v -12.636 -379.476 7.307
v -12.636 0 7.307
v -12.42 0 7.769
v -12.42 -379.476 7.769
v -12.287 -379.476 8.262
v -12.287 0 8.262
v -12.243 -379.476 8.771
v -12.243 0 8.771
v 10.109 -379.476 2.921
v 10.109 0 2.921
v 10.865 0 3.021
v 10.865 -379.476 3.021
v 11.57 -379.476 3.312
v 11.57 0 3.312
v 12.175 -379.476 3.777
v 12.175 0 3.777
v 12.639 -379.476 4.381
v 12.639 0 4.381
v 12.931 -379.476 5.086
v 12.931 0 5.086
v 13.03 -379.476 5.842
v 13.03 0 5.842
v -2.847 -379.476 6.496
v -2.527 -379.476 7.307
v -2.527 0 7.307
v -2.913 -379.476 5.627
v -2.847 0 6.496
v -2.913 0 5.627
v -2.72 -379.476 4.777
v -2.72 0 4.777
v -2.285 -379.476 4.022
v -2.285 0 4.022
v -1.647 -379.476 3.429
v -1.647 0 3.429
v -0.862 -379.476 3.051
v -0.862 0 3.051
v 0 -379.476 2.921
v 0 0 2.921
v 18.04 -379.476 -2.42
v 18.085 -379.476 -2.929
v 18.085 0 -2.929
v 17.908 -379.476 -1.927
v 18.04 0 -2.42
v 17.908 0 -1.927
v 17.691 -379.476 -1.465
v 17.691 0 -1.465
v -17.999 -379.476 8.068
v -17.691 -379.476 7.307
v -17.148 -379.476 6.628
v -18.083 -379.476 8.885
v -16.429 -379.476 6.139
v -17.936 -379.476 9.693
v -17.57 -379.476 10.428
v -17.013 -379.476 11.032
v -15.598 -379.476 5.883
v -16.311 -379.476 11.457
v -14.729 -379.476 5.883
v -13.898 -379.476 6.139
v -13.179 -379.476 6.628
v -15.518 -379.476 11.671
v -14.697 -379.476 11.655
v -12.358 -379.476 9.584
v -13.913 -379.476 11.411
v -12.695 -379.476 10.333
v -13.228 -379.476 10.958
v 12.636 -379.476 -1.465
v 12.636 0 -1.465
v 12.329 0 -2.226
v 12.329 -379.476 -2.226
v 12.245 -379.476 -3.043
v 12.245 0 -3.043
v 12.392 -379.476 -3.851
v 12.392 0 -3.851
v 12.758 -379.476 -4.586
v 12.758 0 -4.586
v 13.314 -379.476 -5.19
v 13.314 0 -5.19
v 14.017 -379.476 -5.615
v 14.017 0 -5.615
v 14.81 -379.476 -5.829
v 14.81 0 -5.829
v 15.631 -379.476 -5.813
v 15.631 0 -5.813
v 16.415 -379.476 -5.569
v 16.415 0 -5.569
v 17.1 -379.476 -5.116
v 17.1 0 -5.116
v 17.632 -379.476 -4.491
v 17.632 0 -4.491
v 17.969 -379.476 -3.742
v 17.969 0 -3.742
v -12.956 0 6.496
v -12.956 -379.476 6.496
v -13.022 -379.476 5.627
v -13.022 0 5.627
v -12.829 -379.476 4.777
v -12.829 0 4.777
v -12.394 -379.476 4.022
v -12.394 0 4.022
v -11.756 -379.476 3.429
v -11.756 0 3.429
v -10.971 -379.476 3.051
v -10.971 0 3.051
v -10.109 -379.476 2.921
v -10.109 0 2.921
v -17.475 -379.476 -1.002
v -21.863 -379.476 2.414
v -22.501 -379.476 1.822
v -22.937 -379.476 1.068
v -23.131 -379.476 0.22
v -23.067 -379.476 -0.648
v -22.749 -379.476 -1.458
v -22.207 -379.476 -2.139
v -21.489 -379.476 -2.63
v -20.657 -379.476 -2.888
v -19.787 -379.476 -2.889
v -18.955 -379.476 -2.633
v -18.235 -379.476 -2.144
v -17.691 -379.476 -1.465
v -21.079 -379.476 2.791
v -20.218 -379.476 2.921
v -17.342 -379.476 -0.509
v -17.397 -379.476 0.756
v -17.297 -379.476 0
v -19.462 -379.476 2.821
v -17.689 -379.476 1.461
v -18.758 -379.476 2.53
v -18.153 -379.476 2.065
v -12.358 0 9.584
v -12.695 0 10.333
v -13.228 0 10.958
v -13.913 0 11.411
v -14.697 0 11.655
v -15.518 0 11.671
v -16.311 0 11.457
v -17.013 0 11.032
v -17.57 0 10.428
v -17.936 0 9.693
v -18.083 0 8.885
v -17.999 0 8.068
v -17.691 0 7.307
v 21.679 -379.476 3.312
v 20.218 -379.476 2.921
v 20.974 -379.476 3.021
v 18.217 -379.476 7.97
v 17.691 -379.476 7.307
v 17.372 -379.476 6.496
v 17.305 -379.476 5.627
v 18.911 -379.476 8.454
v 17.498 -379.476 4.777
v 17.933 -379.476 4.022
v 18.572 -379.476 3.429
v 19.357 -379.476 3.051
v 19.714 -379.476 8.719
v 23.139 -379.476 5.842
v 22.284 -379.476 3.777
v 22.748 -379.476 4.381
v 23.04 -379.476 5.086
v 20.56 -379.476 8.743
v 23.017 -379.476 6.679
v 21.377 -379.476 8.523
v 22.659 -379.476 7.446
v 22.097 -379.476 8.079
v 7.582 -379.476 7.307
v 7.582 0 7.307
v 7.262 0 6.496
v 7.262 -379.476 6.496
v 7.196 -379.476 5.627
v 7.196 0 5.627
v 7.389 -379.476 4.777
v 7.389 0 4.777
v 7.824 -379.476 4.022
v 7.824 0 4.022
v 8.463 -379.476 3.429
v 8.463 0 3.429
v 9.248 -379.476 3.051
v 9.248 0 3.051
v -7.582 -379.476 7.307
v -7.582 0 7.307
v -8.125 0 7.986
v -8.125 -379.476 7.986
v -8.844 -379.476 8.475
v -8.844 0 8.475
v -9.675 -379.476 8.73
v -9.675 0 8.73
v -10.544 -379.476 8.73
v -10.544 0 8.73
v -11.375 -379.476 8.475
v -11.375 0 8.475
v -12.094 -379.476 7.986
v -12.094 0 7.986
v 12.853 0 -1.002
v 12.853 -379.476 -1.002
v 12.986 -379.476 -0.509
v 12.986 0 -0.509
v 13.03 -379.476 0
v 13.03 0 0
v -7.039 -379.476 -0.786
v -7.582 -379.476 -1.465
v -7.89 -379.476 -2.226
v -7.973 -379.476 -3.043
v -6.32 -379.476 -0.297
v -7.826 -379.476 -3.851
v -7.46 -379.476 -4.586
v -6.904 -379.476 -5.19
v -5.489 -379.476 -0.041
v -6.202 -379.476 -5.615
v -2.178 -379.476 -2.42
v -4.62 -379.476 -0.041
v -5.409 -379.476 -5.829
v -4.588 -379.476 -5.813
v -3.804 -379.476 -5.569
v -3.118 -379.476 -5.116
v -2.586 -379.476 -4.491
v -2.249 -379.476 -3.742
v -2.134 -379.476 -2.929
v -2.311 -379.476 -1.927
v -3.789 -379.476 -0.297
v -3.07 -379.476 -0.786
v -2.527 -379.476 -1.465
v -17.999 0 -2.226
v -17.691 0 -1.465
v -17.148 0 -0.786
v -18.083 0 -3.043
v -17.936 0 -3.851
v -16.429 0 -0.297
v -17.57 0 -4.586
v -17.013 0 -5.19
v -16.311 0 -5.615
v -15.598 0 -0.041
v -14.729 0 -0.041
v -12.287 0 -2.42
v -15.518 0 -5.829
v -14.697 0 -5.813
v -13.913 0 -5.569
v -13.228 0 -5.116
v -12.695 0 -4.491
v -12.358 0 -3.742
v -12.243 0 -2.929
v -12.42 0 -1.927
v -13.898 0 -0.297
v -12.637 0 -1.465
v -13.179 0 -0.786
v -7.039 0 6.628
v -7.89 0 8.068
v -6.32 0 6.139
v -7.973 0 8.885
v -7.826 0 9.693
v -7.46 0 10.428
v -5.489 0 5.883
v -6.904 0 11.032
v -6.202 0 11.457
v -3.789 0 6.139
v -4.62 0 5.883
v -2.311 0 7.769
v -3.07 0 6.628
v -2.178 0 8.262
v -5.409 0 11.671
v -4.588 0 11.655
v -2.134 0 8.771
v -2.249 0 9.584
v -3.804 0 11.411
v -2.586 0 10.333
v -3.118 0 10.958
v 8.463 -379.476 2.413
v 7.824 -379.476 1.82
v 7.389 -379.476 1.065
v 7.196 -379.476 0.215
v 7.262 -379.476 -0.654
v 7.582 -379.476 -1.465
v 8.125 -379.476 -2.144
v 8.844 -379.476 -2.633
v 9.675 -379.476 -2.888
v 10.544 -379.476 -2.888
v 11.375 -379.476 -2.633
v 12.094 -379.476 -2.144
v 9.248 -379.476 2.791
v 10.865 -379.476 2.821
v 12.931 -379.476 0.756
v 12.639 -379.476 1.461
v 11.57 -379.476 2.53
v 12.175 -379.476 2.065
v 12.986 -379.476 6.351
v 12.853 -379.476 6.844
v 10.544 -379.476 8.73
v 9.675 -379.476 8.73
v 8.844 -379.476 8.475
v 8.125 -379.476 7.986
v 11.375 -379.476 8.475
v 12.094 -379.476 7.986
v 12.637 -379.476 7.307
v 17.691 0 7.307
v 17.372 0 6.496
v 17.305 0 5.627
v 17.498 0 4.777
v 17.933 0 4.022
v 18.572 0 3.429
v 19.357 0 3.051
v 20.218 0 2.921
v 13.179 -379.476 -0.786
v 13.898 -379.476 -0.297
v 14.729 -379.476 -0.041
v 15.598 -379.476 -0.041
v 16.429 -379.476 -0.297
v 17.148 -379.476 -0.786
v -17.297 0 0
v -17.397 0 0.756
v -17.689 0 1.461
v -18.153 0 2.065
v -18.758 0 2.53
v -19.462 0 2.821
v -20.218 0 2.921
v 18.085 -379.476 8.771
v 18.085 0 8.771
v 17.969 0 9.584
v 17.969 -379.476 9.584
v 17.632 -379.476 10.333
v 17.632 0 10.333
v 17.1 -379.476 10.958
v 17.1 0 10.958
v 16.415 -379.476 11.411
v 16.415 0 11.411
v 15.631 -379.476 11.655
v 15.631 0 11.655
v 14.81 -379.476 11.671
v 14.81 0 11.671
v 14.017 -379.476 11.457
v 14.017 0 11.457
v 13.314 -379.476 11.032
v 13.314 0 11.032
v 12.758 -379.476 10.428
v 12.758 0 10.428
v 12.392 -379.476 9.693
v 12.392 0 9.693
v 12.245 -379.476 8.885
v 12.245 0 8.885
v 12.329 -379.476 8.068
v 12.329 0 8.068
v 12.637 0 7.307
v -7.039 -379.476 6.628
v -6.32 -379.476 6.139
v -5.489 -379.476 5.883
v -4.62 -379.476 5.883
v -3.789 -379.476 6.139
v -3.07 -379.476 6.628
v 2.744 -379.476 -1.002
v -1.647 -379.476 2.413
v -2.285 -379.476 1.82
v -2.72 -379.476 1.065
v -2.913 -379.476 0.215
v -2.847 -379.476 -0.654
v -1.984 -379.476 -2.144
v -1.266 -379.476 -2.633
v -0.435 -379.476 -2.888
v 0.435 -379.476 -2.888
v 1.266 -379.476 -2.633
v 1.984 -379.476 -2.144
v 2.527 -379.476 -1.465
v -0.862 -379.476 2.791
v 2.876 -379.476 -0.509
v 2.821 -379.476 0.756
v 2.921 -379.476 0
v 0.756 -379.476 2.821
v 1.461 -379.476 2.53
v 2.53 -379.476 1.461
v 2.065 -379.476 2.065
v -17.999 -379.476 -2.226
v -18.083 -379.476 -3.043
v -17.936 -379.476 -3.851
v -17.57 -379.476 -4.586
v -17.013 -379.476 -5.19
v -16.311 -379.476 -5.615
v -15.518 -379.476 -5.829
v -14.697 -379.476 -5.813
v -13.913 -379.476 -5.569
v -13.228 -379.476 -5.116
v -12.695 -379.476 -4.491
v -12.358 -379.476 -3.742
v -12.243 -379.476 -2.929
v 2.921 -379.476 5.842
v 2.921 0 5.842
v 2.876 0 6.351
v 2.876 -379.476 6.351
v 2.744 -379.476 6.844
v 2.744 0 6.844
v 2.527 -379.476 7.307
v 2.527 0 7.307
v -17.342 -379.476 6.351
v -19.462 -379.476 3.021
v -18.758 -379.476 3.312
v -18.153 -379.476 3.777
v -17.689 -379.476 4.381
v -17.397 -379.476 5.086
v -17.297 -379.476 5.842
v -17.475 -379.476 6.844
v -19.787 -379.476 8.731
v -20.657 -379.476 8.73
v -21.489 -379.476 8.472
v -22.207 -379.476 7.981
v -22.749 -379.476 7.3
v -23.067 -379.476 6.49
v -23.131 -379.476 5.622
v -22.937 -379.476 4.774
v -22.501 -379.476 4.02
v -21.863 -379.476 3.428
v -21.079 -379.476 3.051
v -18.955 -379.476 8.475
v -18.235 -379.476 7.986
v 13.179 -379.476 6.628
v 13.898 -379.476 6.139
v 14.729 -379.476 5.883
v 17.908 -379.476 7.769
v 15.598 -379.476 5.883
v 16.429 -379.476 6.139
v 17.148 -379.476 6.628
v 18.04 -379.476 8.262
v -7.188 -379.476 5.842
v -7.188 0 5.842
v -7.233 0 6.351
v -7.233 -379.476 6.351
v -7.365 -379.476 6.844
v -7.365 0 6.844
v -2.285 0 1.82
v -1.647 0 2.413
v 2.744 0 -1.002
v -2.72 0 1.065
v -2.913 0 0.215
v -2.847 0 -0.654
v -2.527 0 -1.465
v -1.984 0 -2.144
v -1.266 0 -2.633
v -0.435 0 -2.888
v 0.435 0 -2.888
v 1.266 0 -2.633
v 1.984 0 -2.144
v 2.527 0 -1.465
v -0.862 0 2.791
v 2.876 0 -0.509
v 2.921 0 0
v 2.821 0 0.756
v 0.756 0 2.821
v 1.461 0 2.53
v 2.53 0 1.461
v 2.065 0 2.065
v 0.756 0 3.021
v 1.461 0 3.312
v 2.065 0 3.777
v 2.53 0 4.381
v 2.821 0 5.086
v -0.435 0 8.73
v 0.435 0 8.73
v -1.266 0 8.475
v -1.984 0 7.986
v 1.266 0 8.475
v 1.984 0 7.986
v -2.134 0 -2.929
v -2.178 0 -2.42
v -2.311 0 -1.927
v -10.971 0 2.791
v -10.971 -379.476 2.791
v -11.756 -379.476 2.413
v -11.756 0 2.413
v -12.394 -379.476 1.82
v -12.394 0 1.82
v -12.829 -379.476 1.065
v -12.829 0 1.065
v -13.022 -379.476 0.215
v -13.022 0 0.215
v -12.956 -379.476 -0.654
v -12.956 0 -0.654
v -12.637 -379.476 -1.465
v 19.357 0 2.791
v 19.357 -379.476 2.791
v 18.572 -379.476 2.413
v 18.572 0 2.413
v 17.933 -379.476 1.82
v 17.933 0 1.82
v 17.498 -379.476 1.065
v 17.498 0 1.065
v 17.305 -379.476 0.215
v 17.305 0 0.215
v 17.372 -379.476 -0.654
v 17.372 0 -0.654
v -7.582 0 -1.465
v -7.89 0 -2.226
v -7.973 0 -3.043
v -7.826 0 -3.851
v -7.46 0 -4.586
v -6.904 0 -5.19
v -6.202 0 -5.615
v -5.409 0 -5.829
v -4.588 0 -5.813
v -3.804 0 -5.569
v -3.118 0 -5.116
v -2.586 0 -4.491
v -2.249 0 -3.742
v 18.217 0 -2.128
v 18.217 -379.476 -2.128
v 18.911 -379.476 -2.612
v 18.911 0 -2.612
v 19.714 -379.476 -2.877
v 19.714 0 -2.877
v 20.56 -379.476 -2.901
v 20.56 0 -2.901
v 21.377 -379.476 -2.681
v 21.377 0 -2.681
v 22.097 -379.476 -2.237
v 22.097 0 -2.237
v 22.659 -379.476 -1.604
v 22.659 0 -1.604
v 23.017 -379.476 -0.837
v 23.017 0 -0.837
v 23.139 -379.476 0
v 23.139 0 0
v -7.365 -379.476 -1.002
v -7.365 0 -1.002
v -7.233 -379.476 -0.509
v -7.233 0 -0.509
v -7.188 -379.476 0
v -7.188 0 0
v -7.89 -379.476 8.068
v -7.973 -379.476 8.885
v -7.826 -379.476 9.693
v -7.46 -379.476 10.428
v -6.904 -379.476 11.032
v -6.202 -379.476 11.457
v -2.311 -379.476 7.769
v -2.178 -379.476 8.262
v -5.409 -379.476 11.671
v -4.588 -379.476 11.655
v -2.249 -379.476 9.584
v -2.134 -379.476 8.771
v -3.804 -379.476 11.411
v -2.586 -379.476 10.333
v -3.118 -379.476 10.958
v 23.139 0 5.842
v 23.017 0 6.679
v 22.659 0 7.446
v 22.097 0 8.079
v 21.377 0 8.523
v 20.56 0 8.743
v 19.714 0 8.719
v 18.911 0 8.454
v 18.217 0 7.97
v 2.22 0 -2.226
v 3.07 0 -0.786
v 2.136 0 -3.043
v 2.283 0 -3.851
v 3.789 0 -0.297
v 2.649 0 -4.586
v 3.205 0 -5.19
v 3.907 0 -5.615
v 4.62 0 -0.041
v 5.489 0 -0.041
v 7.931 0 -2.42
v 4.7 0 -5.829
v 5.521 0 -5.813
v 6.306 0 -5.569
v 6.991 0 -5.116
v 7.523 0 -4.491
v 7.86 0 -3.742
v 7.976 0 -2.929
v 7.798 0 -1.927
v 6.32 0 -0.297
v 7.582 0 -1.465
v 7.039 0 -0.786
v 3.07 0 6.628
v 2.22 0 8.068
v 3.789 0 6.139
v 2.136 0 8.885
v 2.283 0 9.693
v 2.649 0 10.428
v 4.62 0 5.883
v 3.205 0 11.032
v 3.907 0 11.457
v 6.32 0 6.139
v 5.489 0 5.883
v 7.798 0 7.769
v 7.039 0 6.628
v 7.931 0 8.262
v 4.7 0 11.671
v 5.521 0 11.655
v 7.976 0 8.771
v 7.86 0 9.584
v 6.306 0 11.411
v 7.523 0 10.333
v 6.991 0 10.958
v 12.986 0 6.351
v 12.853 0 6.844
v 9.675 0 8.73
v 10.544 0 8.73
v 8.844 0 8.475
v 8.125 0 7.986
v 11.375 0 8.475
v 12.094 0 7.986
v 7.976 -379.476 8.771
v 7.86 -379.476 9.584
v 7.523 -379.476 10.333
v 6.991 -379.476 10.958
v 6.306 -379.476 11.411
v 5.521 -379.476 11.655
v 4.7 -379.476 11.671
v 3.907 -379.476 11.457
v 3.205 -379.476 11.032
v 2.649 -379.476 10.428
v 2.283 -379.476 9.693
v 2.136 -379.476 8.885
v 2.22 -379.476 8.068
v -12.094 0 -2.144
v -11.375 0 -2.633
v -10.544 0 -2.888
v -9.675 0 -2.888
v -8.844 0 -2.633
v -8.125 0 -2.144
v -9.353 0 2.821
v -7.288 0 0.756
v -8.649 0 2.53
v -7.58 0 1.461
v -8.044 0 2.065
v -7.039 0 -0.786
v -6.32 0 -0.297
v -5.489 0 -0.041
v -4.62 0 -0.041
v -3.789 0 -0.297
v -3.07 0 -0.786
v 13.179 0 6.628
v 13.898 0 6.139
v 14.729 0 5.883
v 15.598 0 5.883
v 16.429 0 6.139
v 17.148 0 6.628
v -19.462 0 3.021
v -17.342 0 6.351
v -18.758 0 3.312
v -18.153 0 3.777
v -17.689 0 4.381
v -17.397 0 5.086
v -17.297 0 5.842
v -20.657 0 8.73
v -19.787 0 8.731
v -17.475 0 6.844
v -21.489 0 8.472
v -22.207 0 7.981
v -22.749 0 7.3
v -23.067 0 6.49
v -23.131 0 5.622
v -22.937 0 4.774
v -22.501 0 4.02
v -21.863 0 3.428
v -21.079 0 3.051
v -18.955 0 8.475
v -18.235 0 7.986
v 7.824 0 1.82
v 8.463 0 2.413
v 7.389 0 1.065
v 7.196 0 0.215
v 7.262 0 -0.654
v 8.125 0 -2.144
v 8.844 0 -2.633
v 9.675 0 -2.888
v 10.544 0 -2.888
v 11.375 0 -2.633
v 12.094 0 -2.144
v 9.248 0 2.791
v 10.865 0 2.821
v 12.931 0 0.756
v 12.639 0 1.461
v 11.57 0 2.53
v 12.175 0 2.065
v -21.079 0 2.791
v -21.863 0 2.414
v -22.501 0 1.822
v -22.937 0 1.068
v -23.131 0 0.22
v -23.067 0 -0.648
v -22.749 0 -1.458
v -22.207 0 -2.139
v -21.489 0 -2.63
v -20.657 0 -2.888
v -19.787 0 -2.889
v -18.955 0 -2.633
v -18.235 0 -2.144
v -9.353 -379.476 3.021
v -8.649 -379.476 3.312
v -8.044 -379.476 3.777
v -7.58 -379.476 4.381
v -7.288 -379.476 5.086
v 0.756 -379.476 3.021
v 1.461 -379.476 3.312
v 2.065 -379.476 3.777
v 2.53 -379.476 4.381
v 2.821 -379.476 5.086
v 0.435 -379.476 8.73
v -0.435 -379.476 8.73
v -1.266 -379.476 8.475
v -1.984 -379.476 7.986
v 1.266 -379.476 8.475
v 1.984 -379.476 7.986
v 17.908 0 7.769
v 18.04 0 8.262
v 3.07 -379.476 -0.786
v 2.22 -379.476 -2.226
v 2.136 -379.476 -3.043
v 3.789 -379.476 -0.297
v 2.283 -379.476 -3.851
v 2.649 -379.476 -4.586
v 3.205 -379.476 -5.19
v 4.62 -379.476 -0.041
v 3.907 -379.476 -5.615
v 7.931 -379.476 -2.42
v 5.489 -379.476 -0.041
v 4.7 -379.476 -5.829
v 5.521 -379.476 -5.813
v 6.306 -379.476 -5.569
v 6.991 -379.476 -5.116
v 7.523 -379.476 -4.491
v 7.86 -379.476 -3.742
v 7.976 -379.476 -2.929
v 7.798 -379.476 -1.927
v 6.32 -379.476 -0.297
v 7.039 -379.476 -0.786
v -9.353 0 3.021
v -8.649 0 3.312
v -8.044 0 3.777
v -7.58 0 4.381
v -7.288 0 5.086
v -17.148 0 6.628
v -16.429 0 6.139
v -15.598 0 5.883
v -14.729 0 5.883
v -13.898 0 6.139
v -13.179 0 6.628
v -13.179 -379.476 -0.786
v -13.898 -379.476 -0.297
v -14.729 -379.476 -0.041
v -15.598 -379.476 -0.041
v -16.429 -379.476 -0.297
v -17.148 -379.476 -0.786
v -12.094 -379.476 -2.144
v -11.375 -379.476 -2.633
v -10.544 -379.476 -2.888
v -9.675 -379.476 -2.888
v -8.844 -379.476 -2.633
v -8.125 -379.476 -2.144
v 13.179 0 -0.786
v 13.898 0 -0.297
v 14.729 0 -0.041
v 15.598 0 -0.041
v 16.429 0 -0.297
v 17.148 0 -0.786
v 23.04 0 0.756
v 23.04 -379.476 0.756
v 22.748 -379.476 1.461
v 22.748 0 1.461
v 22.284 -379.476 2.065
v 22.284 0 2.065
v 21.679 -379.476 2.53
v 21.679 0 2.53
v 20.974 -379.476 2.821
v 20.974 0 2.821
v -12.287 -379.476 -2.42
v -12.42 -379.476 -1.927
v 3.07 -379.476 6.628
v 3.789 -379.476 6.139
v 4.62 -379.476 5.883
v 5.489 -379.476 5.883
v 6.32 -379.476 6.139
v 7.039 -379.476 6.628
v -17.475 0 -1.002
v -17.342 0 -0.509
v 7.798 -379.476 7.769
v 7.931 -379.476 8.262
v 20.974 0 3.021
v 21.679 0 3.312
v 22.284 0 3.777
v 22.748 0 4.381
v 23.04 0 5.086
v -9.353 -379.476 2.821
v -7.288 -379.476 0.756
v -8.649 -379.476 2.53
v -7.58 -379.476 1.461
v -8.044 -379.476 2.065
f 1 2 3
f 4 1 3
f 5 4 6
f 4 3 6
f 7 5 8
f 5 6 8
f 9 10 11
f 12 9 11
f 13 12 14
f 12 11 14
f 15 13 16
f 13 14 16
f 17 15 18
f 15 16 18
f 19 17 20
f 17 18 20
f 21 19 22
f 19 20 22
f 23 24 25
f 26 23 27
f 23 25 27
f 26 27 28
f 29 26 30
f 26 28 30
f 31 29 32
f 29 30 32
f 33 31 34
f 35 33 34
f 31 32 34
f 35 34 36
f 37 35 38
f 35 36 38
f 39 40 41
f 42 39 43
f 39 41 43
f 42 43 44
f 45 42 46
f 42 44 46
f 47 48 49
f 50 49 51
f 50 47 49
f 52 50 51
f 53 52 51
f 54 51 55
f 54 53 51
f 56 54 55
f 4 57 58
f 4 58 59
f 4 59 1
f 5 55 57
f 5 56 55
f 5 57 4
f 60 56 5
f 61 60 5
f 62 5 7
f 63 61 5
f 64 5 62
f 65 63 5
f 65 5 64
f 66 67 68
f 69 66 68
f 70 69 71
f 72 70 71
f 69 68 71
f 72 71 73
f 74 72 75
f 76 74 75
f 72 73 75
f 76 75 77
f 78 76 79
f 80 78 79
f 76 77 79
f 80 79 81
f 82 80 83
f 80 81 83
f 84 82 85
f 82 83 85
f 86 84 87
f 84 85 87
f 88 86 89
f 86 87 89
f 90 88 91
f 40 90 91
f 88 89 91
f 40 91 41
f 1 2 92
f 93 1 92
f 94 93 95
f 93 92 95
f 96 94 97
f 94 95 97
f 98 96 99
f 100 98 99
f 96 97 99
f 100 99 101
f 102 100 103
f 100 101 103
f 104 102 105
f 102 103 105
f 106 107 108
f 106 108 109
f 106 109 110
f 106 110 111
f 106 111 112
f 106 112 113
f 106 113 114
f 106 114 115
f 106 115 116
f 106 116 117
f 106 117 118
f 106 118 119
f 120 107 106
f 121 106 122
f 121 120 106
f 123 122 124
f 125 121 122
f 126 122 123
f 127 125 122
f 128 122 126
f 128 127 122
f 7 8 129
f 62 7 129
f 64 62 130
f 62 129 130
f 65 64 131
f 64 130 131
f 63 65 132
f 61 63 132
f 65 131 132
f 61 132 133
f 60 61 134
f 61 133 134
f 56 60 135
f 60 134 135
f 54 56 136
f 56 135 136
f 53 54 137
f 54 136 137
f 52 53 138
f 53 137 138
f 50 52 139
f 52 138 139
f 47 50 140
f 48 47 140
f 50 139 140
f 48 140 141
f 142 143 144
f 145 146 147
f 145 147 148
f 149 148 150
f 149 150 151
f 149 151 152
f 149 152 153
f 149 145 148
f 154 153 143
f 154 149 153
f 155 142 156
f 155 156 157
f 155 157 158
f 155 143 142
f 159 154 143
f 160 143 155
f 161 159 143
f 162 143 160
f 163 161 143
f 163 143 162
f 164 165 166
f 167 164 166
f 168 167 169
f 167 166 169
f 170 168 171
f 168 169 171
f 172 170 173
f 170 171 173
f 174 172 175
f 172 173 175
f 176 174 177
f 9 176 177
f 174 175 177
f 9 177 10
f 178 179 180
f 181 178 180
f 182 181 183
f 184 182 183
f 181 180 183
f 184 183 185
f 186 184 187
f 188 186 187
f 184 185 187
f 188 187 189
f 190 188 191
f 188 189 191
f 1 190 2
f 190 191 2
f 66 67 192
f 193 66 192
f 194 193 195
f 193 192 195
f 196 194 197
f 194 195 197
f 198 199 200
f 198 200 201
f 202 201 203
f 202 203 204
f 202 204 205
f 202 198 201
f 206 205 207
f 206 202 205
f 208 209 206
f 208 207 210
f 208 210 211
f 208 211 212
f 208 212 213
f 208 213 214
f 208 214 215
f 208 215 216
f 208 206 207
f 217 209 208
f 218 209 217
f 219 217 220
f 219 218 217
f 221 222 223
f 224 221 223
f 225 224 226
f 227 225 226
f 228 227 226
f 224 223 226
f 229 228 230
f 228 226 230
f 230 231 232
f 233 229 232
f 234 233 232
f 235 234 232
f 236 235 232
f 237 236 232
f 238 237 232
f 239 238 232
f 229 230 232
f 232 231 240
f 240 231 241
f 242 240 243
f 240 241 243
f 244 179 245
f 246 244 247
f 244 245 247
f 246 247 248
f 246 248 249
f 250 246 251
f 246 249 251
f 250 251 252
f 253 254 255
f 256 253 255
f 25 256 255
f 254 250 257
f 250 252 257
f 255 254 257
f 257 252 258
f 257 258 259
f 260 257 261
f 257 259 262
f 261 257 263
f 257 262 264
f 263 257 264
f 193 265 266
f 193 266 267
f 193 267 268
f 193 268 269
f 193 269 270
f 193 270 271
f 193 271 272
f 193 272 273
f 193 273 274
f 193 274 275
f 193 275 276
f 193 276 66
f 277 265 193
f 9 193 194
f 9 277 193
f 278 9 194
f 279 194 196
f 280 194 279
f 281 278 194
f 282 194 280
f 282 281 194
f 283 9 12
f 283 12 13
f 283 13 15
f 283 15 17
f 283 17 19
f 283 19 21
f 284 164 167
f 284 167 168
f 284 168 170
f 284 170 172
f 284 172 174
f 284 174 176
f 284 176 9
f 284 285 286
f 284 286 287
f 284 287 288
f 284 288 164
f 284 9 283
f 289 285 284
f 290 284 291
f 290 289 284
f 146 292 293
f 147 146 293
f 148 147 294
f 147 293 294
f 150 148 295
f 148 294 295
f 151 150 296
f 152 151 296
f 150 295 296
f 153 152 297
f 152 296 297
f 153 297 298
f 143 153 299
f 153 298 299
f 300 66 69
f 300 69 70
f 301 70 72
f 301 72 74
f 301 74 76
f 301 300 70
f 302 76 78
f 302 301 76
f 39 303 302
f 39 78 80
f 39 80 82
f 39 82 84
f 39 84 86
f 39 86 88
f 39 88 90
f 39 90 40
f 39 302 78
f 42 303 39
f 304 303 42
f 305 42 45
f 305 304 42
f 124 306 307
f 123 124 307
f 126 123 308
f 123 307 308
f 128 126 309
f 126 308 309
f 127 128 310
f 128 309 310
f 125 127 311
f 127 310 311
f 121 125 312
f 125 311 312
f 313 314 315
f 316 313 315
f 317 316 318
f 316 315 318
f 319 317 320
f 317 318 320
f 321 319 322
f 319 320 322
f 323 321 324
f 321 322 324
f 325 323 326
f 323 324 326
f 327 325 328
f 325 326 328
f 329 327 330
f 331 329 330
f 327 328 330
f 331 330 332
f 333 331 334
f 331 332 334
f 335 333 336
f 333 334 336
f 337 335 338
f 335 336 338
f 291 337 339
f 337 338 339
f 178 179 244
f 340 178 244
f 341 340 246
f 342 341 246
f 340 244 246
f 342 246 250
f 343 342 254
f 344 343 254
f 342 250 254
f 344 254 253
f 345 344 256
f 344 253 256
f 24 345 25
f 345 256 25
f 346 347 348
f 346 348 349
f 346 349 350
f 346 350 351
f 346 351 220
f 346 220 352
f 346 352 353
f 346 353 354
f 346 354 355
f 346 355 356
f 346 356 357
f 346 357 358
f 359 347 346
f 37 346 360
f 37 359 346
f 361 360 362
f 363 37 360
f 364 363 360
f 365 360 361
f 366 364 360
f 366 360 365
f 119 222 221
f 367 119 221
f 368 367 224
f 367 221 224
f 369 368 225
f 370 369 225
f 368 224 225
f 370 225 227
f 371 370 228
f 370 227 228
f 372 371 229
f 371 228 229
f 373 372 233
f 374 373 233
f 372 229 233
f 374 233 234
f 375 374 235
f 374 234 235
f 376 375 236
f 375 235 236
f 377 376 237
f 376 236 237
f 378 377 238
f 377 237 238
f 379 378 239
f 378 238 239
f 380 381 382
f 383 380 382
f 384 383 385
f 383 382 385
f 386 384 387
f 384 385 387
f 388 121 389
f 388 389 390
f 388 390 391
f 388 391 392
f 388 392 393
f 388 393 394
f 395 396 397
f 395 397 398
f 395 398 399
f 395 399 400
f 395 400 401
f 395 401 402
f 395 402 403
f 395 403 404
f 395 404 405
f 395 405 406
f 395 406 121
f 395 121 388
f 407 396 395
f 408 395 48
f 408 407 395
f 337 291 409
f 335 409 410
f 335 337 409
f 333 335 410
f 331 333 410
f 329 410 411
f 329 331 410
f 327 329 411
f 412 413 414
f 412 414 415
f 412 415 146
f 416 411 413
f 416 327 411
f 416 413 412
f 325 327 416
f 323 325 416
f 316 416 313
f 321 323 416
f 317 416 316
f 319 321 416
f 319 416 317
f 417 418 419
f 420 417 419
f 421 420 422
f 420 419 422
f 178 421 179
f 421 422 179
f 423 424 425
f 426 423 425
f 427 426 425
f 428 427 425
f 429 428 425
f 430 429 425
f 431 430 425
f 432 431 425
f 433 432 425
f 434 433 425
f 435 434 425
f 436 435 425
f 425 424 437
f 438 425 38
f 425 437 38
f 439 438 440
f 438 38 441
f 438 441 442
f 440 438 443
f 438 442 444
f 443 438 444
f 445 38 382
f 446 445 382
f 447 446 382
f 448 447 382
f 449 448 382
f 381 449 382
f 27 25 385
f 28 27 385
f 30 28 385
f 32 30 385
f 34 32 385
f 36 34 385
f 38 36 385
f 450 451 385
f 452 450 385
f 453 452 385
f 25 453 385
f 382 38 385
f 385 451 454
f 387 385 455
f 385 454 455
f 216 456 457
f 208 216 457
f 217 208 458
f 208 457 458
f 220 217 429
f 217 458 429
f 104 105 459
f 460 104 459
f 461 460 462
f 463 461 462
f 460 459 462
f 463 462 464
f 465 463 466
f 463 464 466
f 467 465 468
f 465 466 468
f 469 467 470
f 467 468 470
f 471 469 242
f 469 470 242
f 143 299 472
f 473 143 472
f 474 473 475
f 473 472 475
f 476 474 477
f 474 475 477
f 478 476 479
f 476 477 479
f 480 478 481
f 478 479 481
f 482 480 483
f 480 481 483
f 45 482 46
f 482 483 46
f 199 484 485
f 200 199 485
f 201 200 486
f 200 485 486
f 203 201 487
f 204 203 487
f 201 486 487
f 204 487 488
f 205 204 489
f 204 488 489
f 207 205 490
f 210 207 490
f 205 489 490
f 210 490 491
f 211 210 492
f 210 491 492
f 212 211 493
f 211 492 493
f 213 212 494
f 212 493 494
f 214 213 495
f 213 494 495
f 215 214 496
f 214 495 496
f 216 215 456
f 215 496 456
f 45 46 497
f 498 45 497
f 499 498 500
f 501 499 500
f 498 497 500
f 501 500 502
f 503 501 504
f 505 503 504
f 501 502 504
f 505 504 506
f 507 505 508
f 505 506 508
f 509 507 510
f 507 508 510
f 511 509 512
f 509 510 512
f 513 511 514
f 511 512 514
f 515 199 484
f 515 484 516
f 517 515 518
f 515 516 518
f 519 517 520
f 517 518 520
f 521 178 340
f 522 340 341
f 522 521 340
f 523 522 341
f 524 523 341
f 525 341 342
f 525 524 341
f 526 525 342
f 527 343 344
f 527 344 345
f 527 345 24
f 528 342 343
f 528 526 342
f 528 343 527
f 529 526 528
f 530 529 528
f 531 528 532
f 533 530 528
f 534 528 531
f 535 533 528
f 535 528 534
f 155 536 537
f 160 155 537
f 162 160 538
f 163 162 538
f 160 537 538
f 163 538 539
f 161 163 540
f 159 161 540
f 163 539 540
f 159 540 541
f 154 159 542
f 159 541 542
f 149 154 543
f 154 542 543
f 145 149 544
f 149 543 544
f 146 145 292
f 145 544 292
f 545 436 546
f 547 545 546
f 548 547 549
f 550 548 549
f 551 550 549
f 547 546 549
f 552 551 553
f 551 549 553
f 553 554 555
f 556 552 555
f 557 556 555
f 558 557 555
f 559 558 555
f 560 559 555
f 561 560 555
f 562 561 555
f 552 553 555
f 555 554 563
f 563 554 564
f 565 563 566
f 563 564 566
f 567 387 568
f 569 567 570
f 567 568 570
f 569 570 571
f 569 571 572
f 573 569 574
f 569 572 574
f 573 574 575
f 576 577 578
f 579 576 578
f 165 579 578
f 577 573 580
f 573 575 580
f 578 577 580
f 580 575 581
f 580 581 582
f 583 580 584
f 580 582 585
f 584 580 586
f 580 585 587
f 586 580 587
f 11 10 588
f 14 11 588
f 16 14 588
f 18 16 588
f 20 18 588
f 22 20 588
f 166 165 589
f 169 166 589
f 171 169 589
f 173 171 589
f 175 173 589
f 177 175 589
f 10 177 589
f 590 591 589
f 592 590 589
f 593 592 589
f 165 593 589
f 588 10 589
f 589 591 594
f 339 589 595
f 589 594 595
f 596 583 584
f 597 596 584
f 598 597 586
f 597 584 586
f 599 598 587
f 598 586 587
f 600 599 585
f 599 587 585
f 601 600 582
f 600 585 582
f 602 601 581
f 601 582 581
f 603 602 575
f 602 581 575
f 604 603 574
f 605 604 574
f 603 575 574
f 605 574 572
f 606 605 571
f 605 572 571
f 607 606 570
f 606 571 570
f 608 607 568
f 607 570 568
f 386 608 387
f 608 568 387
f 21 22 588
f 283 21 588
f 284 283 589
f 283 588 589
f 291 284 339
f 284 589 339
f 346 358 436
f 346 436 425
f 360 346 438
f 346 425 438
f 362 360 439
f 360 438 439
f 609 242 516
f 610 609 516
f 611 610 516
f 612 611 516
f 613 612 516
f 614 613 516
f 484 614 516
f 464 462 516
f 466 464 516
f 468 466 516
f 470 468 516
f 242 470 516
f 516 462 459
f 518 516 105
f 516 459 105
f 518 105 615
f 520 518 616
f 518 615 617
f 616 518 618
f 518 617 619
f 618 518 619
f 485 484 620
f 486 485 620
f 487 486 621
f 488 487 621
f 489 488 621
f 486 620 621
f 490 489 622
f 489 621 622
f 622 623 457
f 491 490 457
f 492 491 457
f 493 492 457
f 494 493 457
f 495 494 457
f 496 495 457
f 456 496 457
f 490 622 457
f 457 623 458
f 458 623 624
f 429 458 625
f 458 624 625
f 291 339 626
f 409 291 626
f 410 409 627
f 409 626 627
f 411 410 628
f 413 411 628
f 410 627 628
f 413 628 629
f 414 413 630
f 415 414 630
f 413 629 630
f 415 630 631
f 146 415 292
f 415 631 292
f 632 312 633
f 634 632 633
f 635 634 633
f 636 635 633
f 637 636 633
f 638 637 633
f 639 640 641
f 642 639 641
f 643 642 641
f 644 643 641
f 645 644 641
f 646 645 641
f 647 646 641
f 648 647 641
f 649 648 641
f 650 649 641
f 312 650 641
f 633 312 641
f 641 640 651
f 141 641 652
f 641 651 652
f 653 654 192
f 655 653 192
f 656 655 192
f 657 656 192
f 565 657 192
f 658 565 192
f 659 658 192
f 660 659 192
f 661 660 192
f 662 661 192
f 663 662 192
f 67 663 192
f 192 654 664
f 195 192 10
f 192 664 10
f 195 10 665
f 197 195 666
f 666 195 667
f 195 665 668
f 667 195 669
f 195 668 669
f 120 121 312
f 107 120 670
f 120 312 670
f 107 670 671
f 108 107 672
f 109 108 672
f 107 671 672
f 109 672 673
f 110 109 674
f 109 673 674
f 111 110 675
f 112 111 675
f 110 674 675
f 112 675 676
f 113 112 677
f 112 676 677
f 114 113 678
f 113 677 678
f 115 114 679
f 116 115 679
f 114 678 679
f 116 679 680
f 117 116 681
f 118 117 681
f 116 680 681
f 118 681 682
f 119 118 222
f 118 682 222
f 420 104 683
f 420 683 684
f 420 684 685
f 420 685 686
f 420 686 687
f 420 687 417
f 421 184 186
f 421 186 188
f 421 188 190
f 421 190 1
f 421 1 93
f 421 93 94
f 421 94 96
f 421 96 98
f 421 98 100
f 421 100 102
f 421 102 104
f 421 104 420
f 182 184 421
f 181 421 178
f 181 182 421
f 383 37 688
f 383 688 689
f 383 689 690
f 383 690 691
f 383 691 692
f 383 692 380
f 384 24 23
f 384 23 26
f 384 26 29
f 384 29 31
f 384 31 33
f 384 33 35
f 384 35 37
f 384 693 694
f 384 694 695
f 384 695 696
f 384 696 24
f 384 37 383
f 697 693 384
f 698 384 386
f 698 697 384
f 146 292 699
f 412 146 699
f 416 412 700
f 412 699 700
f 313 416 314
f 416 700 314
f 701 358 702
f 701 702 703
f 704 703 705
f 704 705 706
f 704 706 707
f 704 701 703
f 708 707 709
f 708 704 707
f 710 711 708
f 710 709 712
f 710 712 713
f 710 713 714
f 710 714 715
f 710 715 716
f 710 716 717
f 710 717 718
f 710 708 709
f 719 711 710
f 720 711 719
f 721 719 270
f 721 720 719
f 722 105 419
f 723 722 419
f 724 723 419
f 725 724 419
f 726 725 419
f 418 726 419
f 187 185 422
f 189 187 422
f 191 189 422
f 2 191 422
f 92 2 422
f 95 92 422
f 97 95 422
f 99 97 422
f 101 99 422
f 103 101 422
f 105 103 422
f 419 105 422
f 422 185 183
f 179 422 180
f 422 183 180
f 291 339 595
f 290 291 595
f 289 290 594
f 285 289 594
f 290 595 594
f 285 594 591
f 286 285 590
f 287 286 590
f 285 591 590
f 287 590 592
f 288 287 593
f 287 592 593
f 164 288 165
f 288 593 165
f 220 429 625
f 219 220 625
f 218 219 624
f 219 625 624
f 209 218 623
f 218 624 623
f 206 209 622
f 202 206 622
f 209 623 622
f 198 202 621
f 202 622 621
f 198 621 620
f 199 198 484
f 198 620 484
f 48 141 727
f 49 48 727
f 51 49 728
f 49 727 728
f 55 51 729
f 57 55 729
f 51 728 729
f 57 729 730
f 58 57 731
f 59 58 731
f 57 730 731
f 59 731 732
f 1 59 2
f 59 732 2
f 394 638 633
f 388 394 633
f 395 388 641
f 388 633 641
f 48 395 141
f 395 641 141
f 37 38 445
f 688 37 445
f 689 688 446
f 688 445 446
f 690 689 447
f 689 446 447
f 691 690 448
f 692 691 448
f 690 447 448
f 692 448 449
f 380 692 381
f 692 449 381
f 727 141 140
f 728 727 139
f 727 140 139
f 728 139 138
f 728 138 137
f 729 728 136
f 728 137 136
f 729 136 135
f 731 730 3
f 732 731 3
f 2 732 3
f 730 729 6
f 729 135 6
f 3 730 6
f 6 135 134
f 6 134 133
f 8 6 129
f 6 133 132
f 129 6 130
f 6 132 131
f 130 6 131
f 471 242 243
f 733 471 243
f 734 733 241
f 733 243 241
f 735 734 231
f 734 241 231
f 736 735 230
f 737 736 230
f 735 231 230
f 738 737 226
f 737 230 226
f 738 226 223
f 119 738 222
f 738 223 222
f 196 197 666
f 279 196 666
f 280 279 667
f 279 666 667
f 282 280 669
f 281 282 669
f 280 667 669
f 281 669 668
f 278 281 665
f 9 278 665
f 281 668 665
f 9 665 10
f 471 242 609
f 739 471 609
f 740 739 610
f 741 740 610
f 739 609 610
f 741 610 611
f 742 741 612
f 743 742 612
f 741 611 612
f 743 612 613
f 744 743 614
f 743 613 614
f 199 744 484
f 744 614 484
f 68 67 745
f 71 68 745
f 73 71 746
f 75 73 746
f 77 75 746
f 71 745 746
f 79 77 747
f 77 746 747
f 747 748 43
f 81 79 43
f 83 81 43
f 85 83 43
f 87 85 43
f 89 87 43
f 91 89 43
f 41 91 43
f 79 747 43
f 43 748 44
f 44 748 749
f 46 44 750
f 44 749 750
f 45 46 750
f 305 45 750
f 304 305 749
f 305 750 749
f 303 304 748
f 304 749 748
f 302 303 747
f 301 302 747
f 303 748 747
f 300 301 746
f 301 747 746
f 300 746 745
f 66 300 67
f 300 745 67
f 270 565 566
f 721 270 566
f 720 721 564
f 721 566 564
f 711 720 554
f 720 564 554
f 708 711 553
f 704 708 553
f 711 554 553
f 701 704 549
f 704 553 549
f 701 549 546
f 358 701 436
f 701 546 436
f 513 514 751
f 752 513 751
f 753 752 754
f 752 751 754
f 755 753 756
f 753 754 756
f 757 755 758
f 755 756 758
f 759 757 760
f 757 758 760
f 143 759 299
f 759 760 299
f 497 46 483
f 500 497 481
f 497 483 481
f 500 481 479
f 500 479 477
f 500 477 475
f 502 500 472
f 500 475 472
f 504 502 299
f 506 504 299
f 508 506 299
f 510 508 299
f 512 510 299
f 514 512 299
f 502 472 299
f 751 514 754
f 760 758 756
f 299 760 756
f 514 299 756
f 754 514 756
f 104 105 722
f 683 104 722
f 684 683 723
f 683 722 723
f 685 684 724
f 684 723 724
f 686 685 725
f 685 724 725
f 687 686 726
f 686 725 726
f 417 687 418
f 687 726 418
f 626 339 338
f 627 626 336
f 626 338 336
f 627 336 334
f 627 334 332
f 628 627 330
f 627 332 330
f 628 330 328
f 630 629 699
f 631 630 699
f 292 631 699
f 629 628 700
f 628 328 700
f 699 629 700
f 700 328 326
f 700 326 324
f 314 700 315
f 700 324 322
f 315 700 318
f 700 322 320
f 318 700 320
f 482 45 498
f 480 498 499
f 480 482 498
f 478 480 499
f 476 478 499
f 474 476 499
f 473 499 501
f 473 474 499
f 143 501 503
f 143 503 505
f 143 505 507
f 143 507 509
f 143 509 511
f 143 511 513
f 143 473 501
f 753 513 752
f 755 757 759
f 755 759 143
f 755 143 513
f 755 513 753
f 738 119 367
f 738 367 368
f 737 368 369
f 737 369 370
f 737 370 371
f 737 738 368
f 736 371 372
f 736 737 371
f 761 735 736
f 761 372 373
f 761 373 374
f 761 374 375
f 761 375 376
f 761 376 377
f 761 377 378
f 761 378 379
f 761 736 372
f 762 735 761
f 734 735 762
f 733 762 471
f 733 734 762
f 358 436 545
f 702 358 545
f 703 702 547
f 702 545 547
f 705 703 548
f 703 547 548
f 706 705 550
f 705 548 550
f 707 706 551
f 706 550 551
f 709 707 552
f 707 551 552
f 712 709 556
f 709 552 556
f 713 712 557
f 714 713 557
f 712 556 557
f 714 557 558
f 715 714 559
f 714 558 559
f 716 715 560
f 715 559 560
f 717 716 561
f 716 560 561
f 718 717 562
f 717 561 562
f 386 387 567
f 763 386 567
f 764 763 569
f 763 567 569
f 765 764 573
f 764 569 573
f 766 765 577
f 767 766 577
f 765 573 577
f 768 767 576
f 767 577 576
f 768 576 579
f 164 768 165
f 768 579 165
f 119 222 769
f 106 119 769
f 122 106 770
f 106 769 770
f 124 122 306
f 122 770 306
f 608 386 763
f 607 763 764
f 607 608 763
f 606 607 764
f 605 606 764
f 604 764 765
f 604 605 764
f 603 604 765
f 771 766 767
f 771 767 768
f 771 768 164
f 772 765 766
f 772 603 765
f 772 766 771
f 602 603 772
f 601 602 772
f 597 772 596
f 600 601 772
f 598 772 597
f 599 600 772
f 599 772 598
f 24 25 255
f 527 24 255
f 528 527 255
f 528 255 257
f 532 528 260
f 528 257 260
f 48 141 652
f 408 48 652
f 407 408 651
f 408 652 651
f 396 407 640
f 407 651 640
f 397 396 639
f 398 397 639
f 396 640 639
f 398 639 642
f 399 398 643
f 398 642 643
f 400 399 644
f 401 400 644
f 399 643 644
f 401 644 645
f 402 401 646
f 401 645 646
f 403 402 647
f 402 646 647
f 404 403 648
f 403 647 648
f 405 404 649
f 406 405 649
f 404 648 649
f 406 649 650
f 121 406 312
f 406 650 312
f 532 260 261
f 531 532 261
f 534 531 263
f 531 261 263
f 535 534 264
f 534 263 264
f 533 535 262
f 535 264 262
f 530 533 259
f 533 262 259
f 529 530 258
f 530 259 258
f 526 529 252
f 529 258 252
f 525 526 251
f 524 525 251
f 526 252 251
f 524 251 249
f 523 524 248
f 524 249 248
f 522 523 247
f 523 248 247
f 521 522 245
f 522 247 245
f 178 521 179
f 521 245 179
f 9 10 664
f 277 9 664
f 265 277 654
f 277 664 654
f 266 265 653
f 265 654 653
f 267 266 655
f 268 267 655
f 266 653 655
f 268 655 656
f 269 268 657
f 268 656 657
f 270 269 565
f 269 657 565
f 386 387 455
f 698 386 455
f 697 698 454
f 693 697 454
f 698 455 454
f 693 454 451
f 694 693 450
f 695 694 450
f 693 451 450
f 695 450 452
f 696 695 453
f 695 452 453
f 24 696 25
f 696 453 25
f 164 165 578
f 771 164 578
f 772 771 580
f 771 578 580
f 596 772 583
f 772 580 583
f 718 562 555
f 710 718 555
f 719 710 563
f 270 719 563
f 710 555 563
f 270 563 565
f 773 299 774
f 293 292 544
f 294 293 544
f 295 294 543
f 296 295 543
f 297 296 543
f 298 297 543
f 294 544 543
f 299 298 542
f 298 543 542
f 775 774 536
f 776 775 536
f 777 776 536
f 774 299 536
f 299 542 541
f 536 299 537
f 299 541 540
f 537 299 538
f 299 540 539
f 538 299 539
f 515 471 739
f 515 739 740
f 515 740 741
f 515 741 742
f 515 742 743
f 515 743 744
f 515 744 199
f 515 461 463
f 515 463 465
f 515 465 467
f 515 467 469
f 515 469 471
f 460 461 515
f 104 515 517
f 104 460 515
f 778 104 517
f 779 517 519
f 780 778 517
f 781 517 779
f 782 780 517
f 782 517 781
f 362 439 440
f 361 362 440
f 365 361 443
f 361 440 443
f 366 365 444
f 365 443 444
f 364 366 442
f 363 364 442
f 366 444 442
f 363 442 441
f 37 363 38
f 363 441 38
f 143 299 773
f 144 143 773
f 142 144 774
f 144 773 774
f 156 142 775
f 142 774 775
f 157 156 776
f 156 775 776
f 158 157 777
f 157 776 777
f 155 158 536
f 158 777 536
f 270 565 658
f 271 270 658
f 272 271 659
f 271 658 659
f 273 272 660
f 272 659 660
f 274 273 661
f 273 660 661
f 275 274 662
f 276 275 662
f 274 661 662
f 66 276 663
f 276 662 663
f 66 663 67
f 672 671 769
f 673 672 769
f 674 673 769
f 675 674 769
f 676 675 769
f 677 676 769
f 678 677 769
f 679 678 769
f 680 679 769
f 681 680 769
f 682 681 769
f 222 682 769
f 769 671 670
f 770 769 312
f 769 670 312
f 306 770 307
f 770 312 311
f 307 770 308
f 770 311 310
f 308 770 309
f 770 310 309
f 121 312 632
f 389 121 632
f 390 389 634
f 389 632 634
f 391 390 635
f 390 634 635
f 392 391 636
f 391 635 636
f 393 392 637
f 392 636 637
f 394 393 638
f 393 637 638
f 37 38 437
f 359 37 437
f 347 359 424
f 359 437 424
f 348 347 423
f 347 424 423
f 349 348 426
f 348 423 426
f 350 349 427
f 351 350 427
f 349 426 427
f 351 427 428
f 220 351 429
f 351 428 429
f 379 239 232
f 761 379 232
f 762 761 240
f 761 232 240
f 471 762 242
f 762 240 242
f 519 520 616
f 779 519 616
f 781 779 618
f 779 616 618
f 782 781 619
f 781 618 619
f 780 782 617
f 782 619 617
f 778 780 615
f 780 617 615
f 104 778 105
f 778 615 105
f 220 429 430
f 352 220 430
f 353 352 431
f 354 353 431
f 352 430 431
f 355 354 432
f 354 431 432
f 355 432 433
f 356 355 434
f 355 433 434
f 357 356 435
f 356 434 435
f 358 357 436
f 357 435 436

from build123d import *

# Parameters (mm, degrees)
F1_DEPTH = 379.476


with BuildPart() as f1:
    # F0 (on Front) → F1 (new body)
    with BuildSketch(Plane.XZ):
        with BuildLine():
            ThreePointArc((20.2184, 2.921), (17.687562, 1.458458), (17.6911, -1.46458))
            ThreePointArc((17.6911, -1.46458), (20.976687, -2.820858), (23.1394, 0))
            ThreePointArc((23.1394, 0), (22.283859, 2.065459), (20.2184, 2.921))
        make_face()
        with BuildLine():
            ThreePointArc((17.6911, -1.46458), (15.1638, -0.008161), (12.6365, -1.46458))
            ThreePointArc((12.6365, -1.46458), (14.405513, -5.750019), (18.0848, -2.929161))
            ThreePointArc((18.0848, -2.929161), (17.984658, -2.170874), (17.6911, -1.46458))
        make_face()
        with BuildLine():
            ThreePointArc((7.5819, -1.46458), (5.0546, -0.008161), (2.5273, -1.46458))
            ThreePointArc((2.5273, -1.46458), (4.296313, -5.750019), (7.9756, -2.929161))
            ThreePointArc((7.9756, -2.929161), (7.875458, -2.170874), (7.5819, -1.46458))
        make_face()
        with BuildLine():
            ThreePointArc((7.9756, 8.771161), (4.296313, 11.592019), (2.5273, 7.30658))
            ThreePointArc((2.5273, 7.30658), (5.0546, 5.850161), (7.5819, 7.30658))
            ThreePointArc((7.5819, 7.30658), (7.875458, 8.012874), (7.9756, 8.771161))
        make_face()
        with BuildLine():
            ThreePointArc((-7.5819, 7.30658), (-5.0546, 5.850161), (-2.5273, 7.30658))
            ThreePointArc((-2.5273, 7.30658), (-2.233742, 8.012874), (-2.1336, 8.771161))
            ThreePointArc((-2.1336, 8.771161), (-5.812887, 11.592019), (-7.5819, 7.30658))
        make_face()
        with BuildLine():
            ThreePointArc((7.5819, 7.30658), (7.578362, 4.383542), (10.1092, 2.921))
            ThreePointArc((10.1092, 2.921), (12.174659, 3.776541), (13.0302, 5.842))
            ThreePointArc((13.0302, 5.842), (12.930058, 6.600287), (12.6365, 7.30658))
            ThreePointArc((12.6365, 7.30658), (10.1092, 8.763), (7.5819, 7.30658))
        make_face()
        with BuildLine():
            ThreePointArc((-12.6365, -1.46458), (-10.1092, -2.921), (-7.5819, -1.46458))
            ThreePointArc((-7.5819, -1.46458), (-7.288342, -0.758287), (-7.1882, 0))
            ThreePointArc((-7.1882, 0), (-8.043741, 2.065459), (-10.1092, 2.921))
            ThreePointArc((-10.1092, 2.921), (-12.640038, 1.458458), (-12.6365, -1.46458))
        make_face()
        with BuildLine():
            ThreePointArc((-2.1336, -2.929161), (-2.233742, -2.170874), (-2.5273, -1.46458))
            ThreePointArc((-2.5273, -1.46458), (-5.0546, -0.008161), (-7.5819, -1.46458))
            ThreePointArc((-7.5819, -1.46458), (-5.812887, -5.750019), (-2.1336, -2.929161))
        make_face()
        with BuildLine():
            ThreePointArc((10.1092, 2.921), (7.578362, 1.458458), (7.5819, -1.46458))
            ThreePointArc((7.5819, -1.46458), (10.1092, -2.921), (12.6365, -1.46458))
            ThreePointArc((12.6365, -1.46458), (12.930058, -0.758287), (13.0302, 0))
            ThreePointArc((13.0302, 0), (12.174659, 2.065459), (10.1092, 2.921))
        make_face()
        with BuildLine():
            ThreePointArc((-2.5273, 7.30658), (-2.530838, 4.383542), (0, 2.921))
            ThreePointArc((0, 2.921), (2.065459, 3.776541), (2.921, 5.842))
            ThreePointArc((2.921, 5.842), (2.820858, 6.600287), (2.5273, 7.30658))
            ThreePointArc((2.5273, 7.30658), (0, 8.763), (-2.5273, 7.30658))
        make_face()
        with BuildLine():
            ThreePointArc((-7.1882, 5.842), (-7.288342, 6.600287), (-7.5819, 7.30658))
            ThreePointArc((-7.5819, 7.30658), (-10.1092, 8.763), (-12.6365, 7.30658))
            ThreePointArc((-12.6365, 7.30658), (-12.640038, 4.383542), (-10.1092, 2.921))
            ThreePointArc((-10.1092, 2.921), (-8.043741, 3.776541), (-7.1882, 5.842))
        make_face()
        with BuildLine():
            ThreePointArc((18.0848, 8.771161), (14.405513, 11.592019), (12.6365, 7.30658))
            ThreePointArc((12.6365, 7.30658), (15.1638, 5.850161), (17.6911, 7.30658))
            ThreePointArc((17.6911, 7.30658), (17.984658, 8.012874), (18.0848, 8.771161))
        make_face()
        with BuildLine():
            ThreePointArc((-12.2428, -2.929161), (-12.342942, -2.170874), (-12.6365, -1.46458))
            ThreePointArc((-12.6365, -1.46458), (-15.1638, -0.008161), (-17.6911, -1.46458))
            ThreePointArc((-17.6911, -1.46458), (-15.922087, -5.750019), (-12.2428, -2.929161))
        make_face()
        with BuildLine():
            ThreePointArc((17.6911, 7.30658), (17.687562, 4.383542), (20.2184, 2.921))
            ThreePointArc((20.2184, 2.921), (22.283859, 3.776541), (23.1394, 5.842))
            ThreePointArc((23.1394, 5.842), (20.976687, 8.662858), (17.6911, 7.30658))
        make_face()
        with BuildLine():
            ThreePointArc((-17.6911, 7.30658), (-15.1638, 5.850161), (-12.6365, 7.30658))
            ThreePointArc((-12.6365, 7.30658), (-12.342942, 8.012874), (-12.2428, 8.771161))
            ThreePointArc((-12.2428, 8.771161), (-15.922087, 11.592019), (-17.6911, 7.30658))
        make_face()
        with BuildLine():
            ThreePointArc((-17.2974, 5.842), (-17.397542, 6.600287), (-17.6911, 7.30658))
            ThreePointArc((-17.6911, 7.30658), (-22.749238, 7.300458), (-20.2184, 2.921))
            ThreePointArc((-20.2184, 2.921), (-18.152941, 3.776541), (-17.2974, 5.842))
        make_face()
        with BuildLine():
            ThreePointArc((-20.2184, 2.921), (-22.749238, -1.458458), (-17.6911, -1.46458))
            ThreePointArc((-17.6911, -1.46458), (-17.397542, -0.758287), (-17.2974, 0))
            ThreePointArc((-17.2974, 0), (-18.152941, 2.065459), (-20.2184, 2.921))
        make_face()
        with BuildLine():
            ThreePointArc((2.5273, -1.46458), (2.820858, -0.758287), (2.921, 0))
            ThreePointArc((2.921, 0), (2.065459, 2.065459), (0, 2.921))
            ThreePointArc((0, 2.921), (-2.530838, 1.458458), (-2.5273, -1.46458))
            ThreePointArc((-2.5273, -1.46458), (0, -2.921), (2.5273, -1.46458))
        make_face()
    extrude(amount=F1_DEPTH)


solid = f1.part
